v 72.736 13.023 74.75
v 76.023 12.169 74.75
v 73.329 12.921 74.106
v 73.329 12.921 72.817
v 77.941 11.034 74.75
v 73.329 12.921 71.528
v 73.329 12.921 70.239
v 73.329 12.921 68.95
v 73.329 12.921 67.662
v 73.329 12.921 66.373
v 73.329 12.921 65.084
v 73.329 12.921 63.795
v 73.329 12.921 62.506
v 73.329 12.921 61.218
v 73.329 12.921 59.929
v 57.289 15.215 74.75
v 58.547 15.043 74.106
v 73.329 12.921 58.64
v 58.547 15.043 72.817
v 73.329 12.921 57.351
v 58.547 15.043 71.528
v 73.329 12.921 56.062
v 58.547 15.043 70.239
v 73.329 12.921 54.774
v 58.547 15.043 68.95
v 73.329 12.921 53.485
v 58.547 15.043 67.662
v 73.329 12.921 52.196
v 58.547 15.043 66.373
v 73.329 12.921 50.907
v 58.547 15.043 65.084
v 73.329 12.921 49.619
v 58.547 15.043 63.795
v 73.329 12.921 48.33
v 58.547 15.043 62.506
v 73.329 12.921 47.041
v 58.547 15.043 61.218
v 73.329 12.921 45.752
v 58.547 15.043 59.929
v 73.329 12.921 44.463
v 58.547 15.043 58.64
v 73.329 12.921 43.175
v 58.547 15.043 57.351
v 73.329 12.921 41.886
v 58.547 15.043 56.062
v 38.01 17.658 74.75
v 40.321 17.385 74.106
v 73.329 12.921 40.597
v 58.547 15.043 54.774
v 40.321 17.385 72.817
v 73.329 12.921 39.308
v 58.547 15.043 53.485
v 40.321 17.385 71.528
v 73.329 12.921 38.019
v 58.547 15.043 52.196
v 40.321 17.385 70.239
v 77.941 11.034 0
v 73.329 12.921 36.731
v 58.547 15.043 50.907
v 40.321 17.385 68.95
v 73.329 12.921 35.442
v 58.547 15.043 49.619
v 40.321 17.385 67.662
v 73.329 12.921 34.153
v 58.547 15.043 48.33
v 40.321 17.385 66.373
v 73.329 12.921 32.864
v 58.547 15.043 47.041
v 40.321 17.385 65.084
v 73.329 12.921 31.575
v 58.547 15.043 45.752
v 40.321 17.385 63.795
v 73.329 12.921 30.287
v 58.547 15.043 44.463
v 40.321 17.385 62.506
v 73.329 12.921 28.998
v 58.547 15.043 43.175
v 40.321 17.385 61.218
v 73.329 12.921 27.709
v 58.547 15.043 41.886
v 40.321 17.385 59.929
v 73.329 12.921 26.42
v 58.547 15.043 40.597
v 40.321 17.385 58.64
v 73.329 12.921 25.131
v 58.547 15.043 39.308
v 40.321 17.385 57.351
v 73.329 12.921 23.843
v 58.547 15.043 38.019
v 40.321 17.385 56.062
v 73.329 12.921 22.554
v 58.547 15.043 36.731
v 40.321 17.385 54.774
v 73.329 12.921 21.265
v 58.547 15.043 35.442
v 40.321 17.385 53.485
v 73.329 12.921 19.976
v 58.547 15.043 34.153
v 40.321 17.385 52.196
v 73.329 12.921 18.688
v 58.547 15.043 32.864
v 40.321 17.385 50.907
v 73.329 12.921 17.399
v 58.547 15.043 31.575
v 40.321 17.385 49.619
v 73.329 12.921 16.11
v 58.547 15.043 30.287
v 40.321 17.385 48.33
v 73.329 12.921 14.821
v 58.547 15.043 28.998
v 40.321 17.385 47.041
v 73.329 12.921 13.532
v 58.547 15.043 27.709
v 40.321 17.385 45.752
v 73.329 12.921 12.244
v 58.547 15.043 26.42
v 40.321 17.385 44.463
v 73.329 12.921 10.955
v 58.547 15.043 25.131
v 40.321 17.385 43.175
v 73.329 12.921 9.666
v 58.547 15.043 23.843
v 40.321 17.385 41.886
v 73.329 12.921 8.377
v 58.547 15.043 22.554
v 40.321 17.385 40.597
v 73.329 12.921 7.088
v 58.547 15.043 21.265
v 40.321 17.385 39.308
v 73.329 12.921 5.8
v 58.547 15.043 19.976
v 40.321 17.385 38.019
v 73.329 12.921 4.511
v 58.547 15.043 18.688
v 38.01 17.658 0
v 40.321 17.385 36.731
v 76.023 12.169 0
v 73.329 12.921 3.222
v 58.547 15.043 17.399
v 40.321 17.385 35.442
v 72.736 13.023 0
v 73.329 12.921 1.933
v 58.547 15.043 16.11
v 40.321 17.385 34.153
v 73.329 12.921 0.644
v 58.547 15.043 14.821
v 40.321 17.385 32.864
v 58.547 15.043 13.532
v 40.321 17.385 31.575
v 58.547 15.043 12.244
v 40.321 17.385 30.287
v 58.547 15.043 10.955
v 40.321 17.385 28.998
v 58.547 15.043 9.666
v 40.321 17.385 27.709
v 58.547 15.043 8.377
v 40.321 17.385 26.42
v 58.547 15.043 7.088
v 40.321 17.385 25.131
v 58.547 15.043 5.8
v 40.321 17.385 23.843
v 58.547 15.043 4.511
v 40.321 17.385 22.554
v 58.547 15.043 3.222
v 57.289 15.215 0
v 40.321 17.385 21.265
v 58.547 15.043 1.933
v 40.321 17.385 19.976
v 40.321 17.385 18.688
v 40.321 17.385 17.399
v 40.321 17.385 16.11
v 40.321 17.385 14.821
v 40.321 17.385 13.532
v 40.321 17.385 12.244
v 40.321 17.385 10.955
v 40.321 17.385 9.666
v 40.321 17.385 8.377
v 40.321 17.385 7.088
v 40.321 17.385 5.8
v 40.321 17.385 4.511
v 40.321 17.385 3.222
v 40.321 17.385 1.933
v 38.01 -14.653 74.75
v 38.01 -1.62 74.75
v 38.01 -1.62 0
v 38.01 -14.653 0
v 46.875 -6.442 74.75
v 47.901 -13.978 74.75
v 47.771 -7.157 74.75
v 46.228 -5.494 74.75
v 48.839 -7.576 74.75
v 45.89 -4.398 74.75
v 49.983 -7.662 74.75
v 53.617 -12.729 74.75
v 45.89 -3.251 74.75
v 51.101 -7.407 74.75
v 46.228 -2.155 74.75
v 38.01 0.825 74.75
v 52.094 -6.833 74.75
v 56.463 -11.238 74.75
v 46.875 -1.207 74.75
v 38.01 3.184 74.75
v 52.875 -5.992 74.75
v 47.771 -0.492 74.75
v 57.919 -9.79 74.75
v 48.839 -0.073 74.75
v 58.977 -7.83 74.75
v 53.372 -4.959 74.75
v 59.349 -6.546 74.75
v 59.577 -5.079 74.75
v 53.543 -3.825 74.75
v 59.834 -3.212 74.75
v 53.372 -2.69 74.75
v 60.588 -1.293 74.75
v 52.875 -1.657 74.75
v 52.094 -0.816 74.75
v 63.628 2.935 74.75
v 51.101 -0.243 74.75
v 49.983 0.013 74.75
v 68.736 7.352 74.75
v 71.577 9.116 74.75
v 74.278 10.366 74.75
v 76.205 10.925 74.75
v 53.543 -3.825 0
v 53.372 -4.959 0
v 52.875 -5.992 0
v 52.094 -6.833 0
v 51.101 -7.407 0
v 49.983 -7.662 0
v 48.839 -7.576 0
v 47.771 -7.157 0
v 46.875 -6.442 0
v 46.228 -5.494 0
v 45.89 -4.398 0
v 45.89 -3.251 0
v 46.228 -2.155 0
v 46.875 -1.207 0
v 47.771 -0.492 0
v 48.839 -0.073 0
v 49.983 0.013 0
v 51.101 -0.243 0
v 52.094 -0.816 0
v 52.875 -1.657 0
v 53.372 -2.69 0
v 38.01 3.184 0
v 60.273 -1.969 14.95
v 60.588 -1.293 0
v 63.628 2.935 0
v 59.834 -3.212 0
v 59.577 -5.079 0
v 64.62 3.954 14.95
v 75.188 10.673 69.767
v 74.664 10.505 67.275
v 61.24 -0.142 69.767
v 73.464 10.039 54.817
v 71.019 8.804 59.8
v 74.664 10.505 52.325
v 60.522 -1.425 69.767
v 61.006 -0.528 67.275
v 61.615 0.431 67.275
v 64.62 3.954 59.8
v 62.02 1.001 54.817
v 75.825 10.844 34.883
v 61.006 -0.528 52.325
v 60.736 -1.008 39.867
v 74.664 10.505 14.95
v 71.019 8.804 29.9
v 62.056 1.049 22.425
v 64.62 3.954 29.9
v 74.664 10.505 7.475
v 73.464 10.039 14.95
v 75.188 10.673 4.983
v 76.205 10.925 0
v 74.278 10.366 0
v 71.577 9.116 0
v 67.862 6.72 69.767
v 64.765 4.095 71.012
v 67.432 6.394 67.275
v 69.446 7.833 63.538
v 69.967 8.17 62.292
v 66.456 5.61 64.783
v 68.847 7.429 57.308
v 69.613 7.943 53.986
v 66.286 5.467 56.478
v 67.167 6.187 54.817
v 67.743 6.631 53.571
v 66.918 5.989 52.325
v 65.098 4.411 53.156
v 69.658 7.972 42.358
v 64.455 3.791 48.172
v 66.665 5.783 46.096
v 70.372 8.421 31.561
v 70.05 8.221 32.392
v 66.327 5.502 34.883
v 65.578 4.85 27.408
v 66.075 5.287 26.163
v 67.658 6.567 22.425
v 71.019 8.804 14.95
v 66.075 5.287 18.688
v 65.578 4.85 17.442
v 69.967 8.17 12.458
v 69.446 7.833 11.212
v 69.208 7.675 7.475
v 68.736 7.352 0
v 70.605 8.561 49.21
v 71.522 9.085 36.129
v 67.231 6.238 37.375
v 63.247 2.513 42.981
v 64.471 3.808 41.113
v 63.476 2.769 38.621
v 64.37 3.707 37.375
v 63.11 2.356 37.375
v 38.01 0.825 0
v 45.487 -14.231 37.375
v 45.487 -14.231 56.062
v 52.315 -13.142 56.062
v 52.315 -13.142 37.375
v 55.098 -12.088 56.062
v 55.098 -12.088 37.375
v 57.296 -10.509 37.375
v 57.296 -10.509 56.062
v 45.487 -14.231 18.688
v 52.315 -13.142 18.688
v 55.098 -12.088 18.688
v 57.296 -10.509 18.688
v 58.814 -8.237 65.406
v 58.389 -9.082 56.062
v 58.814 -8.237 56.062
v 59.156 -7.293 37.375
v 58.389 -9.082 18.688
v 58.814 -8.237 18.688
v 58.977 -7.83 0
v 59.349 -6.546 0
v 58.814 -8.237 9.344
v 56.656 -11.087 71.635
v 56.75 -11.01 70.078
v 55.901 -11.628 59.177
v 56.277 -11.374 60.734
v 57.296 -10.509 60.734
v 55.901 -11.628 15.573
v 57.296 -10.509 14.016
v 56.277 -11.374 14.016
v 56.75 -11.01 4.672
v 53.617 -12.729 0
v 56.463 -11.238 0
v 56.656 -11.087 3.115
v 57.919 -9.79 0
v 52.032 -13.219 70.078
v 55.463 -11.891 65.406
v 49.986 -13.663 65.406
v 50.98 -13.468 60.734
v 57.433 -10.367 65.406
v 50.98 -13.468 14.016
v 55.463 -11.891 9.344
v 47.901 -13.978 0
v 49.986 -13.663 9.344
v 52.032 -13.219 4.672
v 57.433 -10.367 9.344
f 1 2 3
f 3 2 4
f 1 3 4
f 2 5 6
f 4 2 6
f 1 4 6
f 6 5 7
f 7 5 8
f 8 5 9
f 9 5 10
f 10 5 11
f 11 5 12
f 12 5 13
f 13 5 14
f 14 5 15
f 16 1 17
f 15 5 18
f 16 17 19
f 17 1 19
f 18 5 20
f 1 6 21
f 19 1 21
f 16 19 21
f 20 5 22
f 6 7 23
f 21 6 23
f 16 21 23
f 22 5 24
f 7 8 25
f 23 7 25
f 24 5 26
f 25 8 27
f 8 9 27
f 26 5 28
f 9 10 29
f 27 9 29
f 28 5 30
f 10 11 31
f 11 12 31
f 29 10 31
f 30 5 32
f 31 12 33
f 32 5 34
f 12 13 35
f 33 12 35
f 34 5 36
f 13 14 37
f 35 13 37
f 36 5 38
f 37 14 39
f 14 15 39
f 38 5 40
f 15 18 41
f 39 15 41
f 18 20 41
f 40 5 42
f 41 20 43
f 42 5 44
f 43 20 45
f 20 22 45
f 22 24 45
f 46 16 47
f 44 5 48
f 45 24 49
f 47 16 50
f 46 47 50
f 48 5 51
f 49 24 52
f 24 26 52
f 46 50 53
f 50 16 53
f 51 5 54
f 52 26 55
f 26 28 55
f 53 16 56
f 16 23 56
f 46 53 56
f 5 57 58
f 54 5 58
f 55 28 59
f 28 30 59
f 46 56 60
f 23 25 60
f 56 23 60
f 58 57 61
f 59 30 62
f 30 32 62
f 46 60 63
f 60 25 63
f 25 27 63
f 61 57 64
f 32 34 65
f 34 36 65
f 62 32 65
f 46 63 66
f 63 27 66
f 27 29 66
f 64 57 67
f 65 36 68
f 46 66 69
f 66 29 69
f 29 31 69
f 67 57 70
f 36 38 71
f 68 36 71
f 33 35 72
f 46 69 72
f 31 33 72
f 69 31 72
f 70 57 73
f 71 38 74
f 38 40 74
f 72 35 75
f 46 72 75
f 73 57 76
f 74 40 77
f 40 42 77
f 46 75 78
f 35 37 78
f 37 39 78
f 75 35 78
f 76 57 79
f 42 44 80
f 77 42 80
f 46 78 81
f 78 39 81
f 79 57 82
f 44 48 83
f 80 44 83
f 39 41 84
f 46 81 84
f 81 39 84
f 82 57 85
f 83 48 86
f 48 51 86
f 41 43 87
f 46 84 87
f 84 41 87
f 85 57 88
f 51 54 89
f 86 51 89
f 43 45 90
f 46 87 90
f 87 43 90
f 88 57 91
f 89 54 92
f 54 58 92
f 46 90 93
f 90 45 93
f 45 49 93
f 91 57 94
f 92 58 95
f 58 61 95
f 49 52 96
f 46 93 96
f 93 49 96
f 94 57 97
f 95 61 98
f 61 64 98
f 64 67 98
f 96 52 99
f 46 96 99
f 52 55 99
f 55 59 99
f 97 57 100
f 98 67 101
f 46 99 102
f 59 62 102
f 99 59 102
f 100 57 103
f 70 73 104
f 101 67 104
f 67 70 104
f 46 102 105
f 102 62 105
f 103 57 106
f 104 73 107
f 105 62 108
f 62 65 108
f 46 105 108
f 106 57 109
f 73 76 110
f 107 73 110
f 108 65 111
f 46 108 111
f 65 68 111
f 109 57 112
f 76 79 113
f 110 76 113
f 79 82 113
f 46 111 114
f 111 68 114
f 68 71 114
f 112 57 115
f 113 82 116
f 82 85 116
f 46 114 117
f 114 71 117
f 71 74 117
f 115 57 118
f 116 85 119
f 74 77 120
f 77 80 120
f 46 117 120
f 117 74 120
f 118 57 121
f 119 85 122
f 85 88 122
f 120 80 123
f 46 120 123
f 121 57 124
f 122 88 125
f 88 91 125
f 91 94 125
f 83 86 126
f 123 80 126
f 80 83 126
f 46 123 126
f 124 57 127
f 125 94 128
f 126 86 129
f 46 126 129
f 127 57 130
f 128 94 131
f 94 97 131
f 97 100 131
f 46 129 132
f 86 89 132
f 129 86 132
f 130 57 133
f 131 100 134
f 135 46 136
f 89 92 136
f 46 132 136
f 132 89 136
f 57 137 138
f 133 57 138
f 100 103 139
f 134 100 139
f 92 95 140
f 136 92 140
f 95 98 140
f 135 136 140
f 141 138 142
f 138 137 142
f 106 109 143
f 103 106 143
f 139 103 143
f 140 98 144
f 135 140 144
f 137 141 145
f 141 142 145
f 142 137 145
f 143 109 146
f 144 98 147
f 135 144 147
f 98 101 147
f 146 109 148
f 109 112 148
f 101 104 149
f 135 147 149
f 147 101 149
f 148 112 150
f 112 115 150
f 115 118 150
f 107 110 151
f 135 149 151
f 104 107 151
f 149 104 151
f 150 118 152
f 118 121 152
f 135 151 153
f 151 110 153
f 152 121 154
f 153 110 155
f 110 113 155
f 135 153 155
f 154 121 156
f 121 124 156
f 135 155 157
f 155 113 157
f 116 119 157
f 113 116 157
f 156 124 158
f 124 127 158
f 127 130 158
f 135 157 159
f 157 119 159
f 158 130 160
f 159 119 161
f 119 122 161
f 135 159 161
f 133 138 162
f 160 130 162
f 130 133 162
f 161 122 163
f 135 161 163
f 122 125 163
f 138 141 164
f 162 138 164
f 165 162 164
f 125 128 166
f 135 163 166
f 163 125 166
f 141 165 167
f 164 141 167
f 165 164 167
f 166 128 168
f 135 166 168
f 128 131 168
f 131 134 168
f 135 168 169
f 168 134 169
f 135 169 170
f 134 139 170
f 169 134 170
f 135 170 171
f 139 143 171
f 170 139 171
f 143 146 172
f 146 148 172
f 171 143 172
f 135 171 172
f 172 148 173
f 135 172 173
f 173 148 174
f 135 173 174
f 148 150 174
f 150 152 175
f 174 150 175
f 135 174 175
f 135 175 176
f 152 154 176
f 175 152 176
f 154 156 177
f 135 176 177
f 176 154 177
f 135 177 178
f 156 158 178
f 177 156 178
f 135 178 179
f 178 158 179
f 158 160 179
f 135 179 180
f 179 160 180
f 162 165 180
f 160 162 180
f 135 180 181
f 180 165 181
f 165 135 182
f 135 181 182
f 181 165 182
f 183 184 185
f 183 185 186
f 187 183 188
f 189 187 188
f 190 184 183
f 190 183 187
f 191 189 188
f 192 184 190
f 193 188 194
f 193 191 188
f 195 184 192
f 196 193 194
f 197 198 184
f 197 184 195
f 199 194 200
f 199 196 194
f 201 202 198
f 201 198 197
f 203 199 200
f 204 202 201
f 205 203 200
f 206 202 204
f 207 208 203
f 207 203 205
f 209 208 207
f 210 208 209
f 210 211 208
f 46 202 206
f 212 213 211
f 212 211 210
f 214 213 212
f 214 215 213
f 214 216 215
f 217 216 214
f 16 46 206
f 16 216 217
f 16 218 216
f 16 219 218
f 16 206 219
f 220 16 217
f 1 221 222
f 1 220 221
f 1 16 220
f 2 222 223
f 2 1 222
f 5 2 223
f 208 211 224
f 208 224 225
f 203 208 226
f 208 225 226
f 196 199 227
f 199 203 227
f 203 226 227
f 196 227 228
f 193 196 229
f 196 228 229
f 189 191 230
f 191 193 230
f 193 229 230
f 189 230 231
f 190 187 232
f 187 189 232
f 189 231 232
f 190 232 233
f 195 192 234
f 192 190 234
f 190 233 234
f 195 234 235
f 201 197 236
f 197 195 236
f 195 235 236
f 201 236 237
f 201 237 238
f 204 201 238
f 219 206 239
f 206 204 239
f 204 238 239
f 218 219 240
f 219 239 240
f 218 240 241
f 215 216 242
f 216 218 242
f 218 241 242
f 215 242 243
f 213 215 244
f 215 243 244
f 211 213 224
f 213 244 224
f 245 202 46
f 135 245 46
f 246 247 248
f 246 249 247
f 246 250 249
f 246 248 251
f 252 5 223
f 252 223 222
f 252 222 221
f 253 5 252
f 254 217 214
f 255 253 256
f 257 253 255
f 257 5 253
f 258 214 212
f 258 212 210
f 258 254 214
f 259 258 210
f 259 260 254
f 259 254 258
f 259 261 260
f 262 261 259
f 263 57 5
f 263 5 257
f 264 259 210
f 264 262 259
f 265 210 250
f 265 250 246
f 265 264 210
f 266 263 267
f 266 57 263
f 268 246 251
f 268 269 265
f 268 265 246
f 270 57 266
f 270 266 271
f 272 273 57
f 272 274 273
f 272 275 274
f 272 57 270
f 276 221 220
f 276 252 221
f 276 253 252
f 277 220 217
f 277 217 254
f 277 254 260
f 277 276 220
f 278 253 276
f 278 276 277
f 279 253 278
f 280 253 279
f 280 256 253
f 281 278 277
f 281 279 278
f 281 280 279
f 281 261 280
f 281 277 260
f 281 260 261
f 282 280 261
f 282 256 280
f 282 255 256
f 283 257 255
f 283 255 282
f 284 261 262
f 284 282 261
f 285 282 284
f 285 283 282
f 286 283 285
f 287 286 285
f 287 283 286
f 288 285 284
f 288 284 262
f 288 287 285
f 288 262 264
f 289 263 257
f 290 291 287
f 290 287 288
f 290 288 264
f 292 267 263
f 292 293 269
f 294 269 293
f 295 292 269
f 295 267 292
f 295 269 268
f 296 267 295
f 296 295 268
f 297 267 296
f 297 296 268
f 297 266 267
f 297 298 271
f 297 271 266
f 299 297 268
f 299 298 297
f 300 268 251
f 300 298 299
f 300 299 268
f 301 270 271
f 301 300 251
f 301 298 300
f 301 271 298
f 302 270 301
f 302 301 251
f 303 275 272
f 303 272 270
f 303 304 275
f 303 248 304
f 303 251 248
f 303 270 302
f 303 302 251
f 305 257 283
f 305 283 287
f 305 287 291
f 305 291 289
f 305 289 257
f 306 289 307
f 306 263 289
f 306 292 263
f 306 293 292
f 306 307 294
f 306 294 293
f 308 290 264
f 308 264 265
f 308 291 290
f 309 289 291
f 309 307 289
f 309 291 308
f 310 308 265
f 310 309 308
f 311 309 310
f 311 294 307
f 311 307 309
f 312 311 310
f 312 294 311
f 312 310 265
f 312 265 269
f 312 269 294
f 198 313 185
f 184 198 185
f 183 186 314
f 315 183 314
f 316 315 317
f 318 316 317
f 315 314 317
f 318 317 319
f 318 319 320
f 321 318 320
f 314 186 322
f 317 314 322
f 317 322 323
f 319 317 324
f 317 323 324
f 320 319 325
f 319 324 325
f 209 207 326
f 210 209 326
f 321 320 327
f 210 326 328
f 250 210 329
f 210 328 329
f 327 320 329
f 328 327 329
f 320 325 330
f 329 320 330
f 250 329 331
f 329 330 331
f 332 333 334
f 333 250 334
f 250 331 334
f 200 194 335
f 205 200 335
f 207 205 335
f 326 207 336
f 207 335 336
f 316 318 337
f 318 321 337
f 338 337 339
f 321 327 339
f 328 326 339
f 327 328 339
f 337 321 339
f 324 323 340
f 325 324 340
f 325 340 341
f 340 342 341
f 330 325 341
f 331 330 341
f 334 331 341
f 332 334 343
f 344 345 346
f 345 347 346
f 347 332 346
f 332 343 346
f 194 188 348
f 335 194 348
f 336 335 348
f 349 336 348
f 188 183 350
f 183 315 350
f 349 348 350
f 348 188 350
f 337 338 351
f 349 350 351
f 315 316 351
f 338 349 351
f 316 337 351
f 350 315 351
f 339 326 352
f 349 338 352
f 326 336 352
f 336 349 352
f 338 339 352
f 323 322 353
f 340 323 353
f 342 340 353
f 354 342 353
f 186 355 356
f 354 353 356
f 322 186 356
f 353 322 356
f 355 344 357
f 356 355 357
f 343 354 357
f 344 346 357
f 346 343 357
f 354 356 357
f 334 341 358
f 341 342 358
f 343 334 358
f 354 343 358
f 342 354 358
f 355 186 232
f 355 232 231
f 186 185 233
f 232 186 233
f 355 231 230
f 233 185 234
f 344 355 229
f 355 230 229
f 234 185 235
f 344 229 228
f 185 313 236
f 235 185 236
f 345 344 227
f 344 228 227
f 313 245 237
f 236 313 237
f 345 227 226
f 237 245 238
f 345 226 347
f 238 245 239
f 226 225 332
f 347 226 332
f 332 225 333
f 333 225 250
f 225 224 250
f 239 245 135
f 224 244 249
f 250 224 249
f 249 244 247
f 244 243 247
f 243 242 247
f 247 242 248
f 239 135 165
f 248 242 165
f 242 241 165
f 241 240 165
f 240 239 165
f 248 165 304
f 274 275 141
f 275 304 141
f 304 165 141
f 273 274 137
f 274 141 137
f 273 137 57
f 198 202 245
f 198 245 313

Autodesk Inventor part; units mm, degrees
ref_plane "YZ Plane" through (0, 0, 0) normal (1, 0, 0) x (0, 1, 0)
ref_plane "XZ Plane" through (0, 0, 0) normal (0, 1, 0) x (-1, 0, 0)
ref_plane "XY Plane" through (0, 0, 0) normal (0, 0, 1) x (1, 0, 0)
sketch "Sketch3" plane through (0, 0, 0) normal (0, 0, 1) x (1, 0, 0)
  line L0 (-80.5781, 0.8246) -> (-80.5781, 20.7988) construction
  circle A0 centre (-80.5781, 0.8246) radius 13.481
  line L1 (-53.7179, 12.5571) -> (-53.7179, -10.9927)
  arc A1 (-53.7179, -10.9927) -> (-51.5054, -12.9814) centre (-51.7179, -10.9927) ccw
  arc A2 (-51.5054, 14.5458) -> (-53.7179, 12.5571) centre (-51.7179, 12.5571) ccw
  line L2 (36.2229, -3.6088) -> (-51.5054, -12.9814)
  line L3 (38.0104, 3.1845) -> (38.0104, -1.6201)
  line L4 (-80.5781, 0.8246) -> (49.5525, 0.8246) construction
  circle A3 centre (49.6953, -3.8247) radius 3.848
  line L5 (59.6953, 14.884) -> (59.6953, -12.7998) construction
  spline S0 degree 4 poles (77.9414, 11.0338) (75.5683, 12.9654) (71.7145, 13.0272) (66.8099, 13.9036) (60.7685, 14.7338) (56.2959, 15.3578) (51.7728, 15.9509) (47.2242, 16.5426) (42.6244, 17.1111) (37.9974, 17.6651) (33.3378, 18.1987) (28.6546, 18.7114) (23.9504, 19.2026) (19.2309, 19.6699) (14.5002, 20.1135) (9.7632, 20.5291) (5.025, 20.9191) (0.2903, 21.2792) (-4.4372, 21.6095) (-9.151, 21.9092) (-13.8524, 22.1766) (-18.5268, 22.4102) (-23.2002, 22.6105) (-27.8558, 22.7627) (-32.4748, 22.8704) (-37.0553, 22.9312) (-41.5904, 22.9454) (-46.0738, 22.9127) (-50.5027, 22.8323) (-54.8678, 22.7052) (-59.1755, 22.5324) (-63.394, 22.3084) (-67.5752, 22.0492) (-71.5451, 21.7209) (-75.7777, 21.4072) (-79.04, 20.9063) (-83.4863, 20.5541) (-87.0067, 20.037) (-90.7113, 19.5168) (-94.2172, 18.9459) (-97.6363, 18.3426) (-100.9342, 17.7015) (-104.1216, 17.0263) (-107.1909, 16.3187) (-110.1396, 15.5797) (-112.9656, 14.8117) (-115.6652, 14.0172) (-118.2357, 13.1965) (-120.6759, 12.3541) (-122.9817, 11.4895) (-125.1529, 10.6071) (-127.1857, 9.7065) (-129.0794, 8.7914) (-130.8324, 7.8633) (-132.4429, 6.923) (-133.9096, 5.9737) (-135.2322, 5.016) (-136.4083, 4.0508) (-137.4392, 3.0816) (-138.3215, 2.1025) (-139.0592, 1.1321) (-139.6407, 0.1249) (-140.106, -0.8362) (-140.3589, -2.0477) (-140.602, -2.598) (-140.1166, -5.4607) (-140.0539, -5.4622) (-139.4639, -6.7645) (-138.8842, -7.4979) (-138.1173, -8.3934) (-137.2199, -9.1877) (-136.1721, -9.9852) (-134.9893, -10.738) (-133.6669, -11.4655) (-132.2091, -12.1599) (-130.6156, -12.8245) (-128.8897, -13.4579) (-127.0312, -14.0591) (-125.0439, -14.6296) (-122.9287, -15.1678) (-120.6879, -15.6738) (-118.3241, -16.1476) (-115.8396, -16.5892) (-113.2366, -16.9984) (-110.5176, -17.3742) (-107.6861, -17.7183) (-104.7439, -18.0297) (-101.6943, -18.3095) (-98.5398, -18.5568) (-95.2843, -18.7732) (-91.9297, -18.9579) (-88.48, -19.1131) (-84.9381, -19.2376) (-81.3071, -19.3341) (-77.5906, -19.4015) (-73.7915, -19.4421) (-69.9139, -19.4561) (-65.961, -19.445) (-61.9362, -19.4102) (-57.8434, -19.3518) (-53.6861, -19.2727) (-49.4679, -19.1731) (-45.1932, -19.0538) (-40.8649, -18.9183) (-36.4879, -18.766) (-32.0649, -18.5992) (-27.598, -18.4192) (-23.0941, -18.227) (-18.5434, -18.0273) (-13.9382, -17.8076) (-9.3141, -17.5719) (-4.666, -17.3195) (-0.0002, -17.052) (4.6675, -16.7728) (9.3655, -16.4759) (14.0236, -16.1832) (19.545, -15.7815) (23.3079, -15.6072) (27.1098, -15.1781) (28.8959, -15.0599) knots 0 0 0 0 0 0.024672 0.034555 0.0445 0.054495 0.064543 0.074632 0.084755 0.094911 0.105094 0.115299 0.125521 0.135755 0.145995 0.156237 0.166475 0.176705 0.186921 0.197118 0.207299 0.217463 0.227605 0.23772 0.247796 0.257824 0.267798 0.277713 0.287563 0.297345 0.307053 0.31668 0.326224 0.335555 0.344908 0.354162 0.363308 0.372467 0.381393 0.390196 0.398872 0.407415 0.41582 0.424082 0.432193 0.44015 0.447945 0.455574 0.46303 0.470307 0.477401 0.484305 0.491015 0.497525 0.503831 0.509931 0.515822 0.521506 0.526986 0.53227 0.537373 0.542316 0.547131 0.552525 0.557529 0.562533 0.567581 0.57205 0.576988 0.582082 0.587354 0.592817 0.598478 0.604341 0.610406 0.616671 0.623133 0.629789 0.636632 0.643658 0.650861 0.658236 0.665777 0.673478 0.681333 0.689338 0.697486 0.705771 0.71419 0.722736 0.731403 0.740188 0.749084 0.758087 0.767192 0.776393 0.785687 0.795067 0.804529 0.814069 0.823682 0.833362 0.843106 0.852907 0.862763 0.872667 0.88262 0.892624 0.902675 0.912766 0.92289 0.933033 0.943191 0.953358 0.963531 0.973703 0.984092 1 1 1 1 1
  line L6 (7.5013, -16.4763) -> (50.2906, -13.6435) construction
  arc A4 (44.8353, -17.2546) -> (13.385, -19.3367) centre (31.5327, -54.8885) ccw construction
  line L7 (159.6953, -3.8066) -> (59.6953, -3.8066) construction
  line L8 (-51.5054, 14.5458) -> (36.2229, 5.1732)
  arc A5 (36.2229, -3.6088) -> (38.0104, -1.6201) centre (36.0104, -1.6201) ccw
  arc A6 (38.0104, 3.1845) -> (36.2229, 5.1732) centre (36.0104, 3.1845) ccw
  spline S1 degree 4 poles (78.1029, 11.0141) (76.6463, 11.2227) (73.9909, 10.5042) (70.2765, 8.6041) (66.0429, 5.3938) (62.3889, 1.8499) (60.314, -1.2467) (59.5572, -3.5763) (59.5773, -5.0793) knots 0 0 0 0 0 0.302475 0.43895 0.576633 0.708802 1 1 1 1 1
  spline S2 degree 4 poles (28.8959, -15.0599) (34.0984, -14.7105) (49.269, -14.182) (58.5645, -15.239) (59.5773, -5.0793) knots 0 0 0 0 0 1 1 1 1 1
  line L9 (28.8959, -15.0599) -> (34.0984, -14.7105) construction
  line L10 (34.0984, -14.7105) -> (49.269, -14.182) construction
  line L11 (49.269, -14.182) -> (58.5645, -15.239) construction
  line L12 (58.5645, -15.239) -> (59.5773, -5.0793) construction
  line L13 (-140.4646, -2.8394) -> (159.4818, -3.8173) construction
  line L14 (-132.0856, 0.6333) -> (-132.0856, -6.3667)
  line L15 (-132.0856, -6.3667) -> (-110.3816, -12.3574)
  line L16 (-110.3816, -12.3574) -> (-104.797, -12.3574)
  line L17 (-104.797, -12.3574) -> (-104.797, -18.0156)
  line L18 (-132.0856, 0.6333) -> (-110.3816, 10.553)
  line L19 (-110.3816, 10.553) -> (-104.1736, 10.553)
  line L20 (-104.1736, 10.553) -> (-104.1736, 17.0026)
  line L21 (38.0104, 0.8246) -> (38.0104, -14.6534)
  line L22 (38.0104, 0.8246) -> (38.0104, 17.6585)
  point P0 (0, 0)
  point P1 (17.6589, 23.5628)
  point P2 (75.883, 10.8572)
  point P3 (72.8647, 9.7686)
  point P4 (69.4179, 7.8149)
  point P5 (66.0452, 5.2617)
  point P6 (63.1887, 2.4463)
  point P7 (61.1228, -0.3317)
  point P8 (59.9357, -2.8689)
  point P9 (-160.0931, -3.8671)
  point P10 (28.8959, -15.0599)
  point P11 (69.5533, 13.4647)
  point P12 (65.1899, 14.1023)
  point P13 (60.7936, 14.7318)
  point P14 (56.3207, 15.3468)
  point P15 (51.7945, 15.947)
  point P16 (47.2398, 16.5346)
  point P17 (42.6414, 17.1053)
  point P18 (33.3491, 18.1925)
  point P19 (28.6632, 18.7055)
  point P20 (23.9568, 19.1966)
  point P21 (19.2348, 19.6643)
  point P22 (14.5017, 20.1074)
  point P23 (9.7623, 20.5238)
  point P24 (5.0217, 20.9132)
  point P25 (0.2844, 21.2735)
  point P26 (-4.4451, 21.6038)
  point P27 (-9.1614, 21.9032)
  point P28 (-13.86, 22.1702)
  point P29 (-18.5361, 22.4036)
  point P30 (-23.211, 22.601)
  point P31 (-27.8721, 22.754)
  point P32 (-32.4966, 22.8611)
  point P33 (-37.0797, 22.9217)
  point P34 (-41.6169, 22.9356)
  point P35 (-46.1028, 22.9023)
  point P36 (-50.5329, 22.8216)
  point P37 (-54.9021, 22.6941)
  point P38 (-59.2065, 22.5195)
  point P39 (-63.4406, 22.2977)
  point P40 (-67.6008, 22.0302)
  point P41 (-71.6806, 21.7165)
  point P42 (-75.6814, 21.3591)
  point P43 (-79.1834, 20.9458)
  point P44 (-83.4048, 20.5095)
  point P45 (-87.1309, 20.023)
  point P46 (-90.7527, 19.494)
  point P47 (-94.2725, 18.9266)
  point P48 (-97.6845, 18.3211)
  point P49 (-100.9861, 17.6791)
  point P50 (-107.2438, 16.2934)
  point P51 (-110.1931, 15.553)
  point P52 (-113.0194, 14.7835)
  point P53 (-115.7191, 13.987)
  point P54 (-118.2898, 13.165)
  point P55 (-120.7294, 12.3201)
  point P56 (-123.0349, 11.454)
  point P57 (-125.2048, 10.569)
  point P58 (-127.2364, 9.6666)
  point P59 (-129.1282, 8.7491)
  point P60 (-130.8786, 7.8185)
  point P61 (-132.486, 6.8762)
  point P62 (-133.9488, 5.9245)
  point P63 (-135.2661, 4.9648)
  point P64 (-136.4363, 3.9987)
  point P65 (-137.4592, 3.0275)
  point P66 (-138.3336, 2.0531)
  point P67 (-139.0591, 1.0763)
  point P68 (-139.6352, 0.0983)
  point P69 (-140.0613, -0.8802)
  point P70 (-140.338, -1.8576)
  point P71 (-140.1239, -5.2398)
  point P72 (-139.9547, -5.7022)
  point P73 (-139.492, -6.6066)
  point P74 (-138.8844, -7.4823)
  point P75 (-138.1328, -8.3292)
  point P76 (-137.2384, -9.147)
  point P77 (-136.202, -9.9355)
  point P78 (-135.0249, -10.6943)
  point P79 (-133.7085, -11.4228)
  point P80 (-132.2548, -12.1206)
  point P81 (-130.6648, -12.7879)
  point P82 (-128.941, -13.4239)
  point P83 (-127.0846, -14.0282)
  point P84 (-125.0983, -14.6009)
  point P85 (-122.9839, -15.1415)
  point P86 (-120.7435, -15.6497)
  point P87 (-118.3798, -16.1256)
  point P88 (-115.8952, -16.569)
  point P89 (-113.2918, -16.9797)
  point P90 (-110.5723, -17.3574)
  point P91 (-107.74, -17.7027)
  point P92 (-101.7463, -18.2964)
  point P93 (-98.5909, -18.5451)
  point P94 (-95.3341, -18.7623)
  point P95 (-91.9783, -18.9484)
  point P96 (-88.5271, -19.1041)
  point P97 (-84.9838, -19.2298)
  point P98 (-81.3514, -19.3267)
  point P99 (-77.6332, -19.3951)
  point P100 (-73.8324, -19.4362)
  point P101 (-69.9531, -19.4509)
  point P102 (-65.9985, -19.4404)
  point P103 (-61.9719, -19.4059)
  point P104 (-57.8772, -19.3483)
  point P105 (-53.718, -19.2694)
  point P106 (-49.4979, -19.1701)
  point P107 (-45.2211, -19.0516)
  point P108 (-40.8909, -18.916)
  point P109 (-36.5118, -18.7642)
  point P110 (-32.0871, -18.5977)
  point P111 (-27.6213, -18.418)
  point P112 (-23.1183, -18.2269)
  point P113 (-18.5646, -18.0247)
  point P114 (-13.9566, -17.8054)
  point P115 (-9.3252, -17.5693)
  point P116 (-4.674, -17.317)
  point P117 (-0.0078, -17.05)
  point P118 (4.6686, -16.7695)
  point P119 (9.3513, -16.477)
  point P120 (14.0352, -16.1731)
  point P121 (18.7161, -15.8596)
  point P122 (23.3889, -15.5371)
  point P123 (78.0825, 12.164)
  point P124 (159.2574, -3.8401)
  point P125 (158.8836, -3.8779)
  point P126 (158.3607, -3.9307)
  point P127 (157.6896, -3.9985)
  point P128 (156.8706, -4.081)
  point P129 (155.9046, -4.1779)
  point P130 (154.7931, -4.2892)
  point P131 (153.5367, -4.4143)
  point P132 (152.1372, -4.5532)
  point P133 (150.5955, -4.7056)
  point P134 (148.914, -4.8712)
  point P135 (147.0936, -5.0494)
  point P136 (145.137, -5.2399)
  point P137 (143.0457, -5.4421)
  point P138 (140.8221, -5.6563)
  point P139 (138.4686, -5.8813)
  point P140 (135.9876, -6.1174)
  point P141 (133.3815, -6.3634)
  point P142 (130.6533, -6.6196)
  point P143 (127.8054, -6.8851)
  point P144 (124.8414, -7.1596)
  point P145 (121.7634, -7.4428)
  point P146 (118.5756, -7.7341)
  point P147 (115.2804, -8.0332)
  point P148 (111.8817, -8.3395)
  point P149 (108.3828, -8.6527)
  point P150 (104.787, -8.9722)
  point P151 (101.0985, -9.2974)
  point P152 (97.3206, -9.6283)
  point P153 (93.4572, -9.9643)
  point P154 (89.5122, -10.3048)
  point P155 (85.4898, -10.6492)
  point P156 (81.3936, -10.9969)
  point P157 (77.2284, -11.3479)
  point P158 (72.9975, -11.701)
  point P159 (68.7057, -12.0556)
  point P160 (64.3572, -12.4117)
  point P161 (59.9559, -12.7678)
  point P162 (55.5069, -13.1239)
  point P163 (51.0138, -13.4788)
  point P164 (46.4817, -13.8316)
  point P165 (41.9148, -14.182)
  point P166 (35.7035, -14.3277)
  point P167 (32.6946, -14.8708)
  point P168 (82.2459, 11.5043)
  point P169 (86.3364, 10.8401)
  point P170 (90.3495, 10.1732)
  point P171 (94.2816, 9.5051)
  point P172 (98.1288, 8.837)
  point P173 (101.8872, 8.171)
  point P174 (105.5538, 7.5086)
  point P175 (109.1244, 6.8507)
  point P176 (112.596, 6.1997)
  point P177 (115.9653, 5.5565)
  point P178 (119.2287, 4.9229)
  point P179 (122.3835, 4.3007)
  point P180 (125.4264, 3.6911)
  point P181 (128.3547, 3.0956)
  point P182 (131.1654, 2.5157)
  point P183 (133.8561, 1.9532)
  point P184 (136.4244, 1.4093)
  point P185 (138.8676, 0.8855)
  point P186 (141.1833, 0.383)
  point P187 (143.3697, -0.0964)
  point P188 (145.4247, -0.5518)
  point P189 (147.3462, -0.9817)
  point P190 (149.1327, -1.3852)
  point P191 (150.7821, -1.7608)
  point P192 (152.2935, -2.1073)
  point P193 (153.6651, -2.4241)
  point P194 (154.8954, -2.7103)
  point P195 (155.9838, -2.9647)
  point P196 (156.9291, -3.187)
  point P197 (157.7307, -3.376)
  point P198 (158.3871, -3.5317)
  point P199 (158.8986, -3.6529)
  dimension "d3" = 26.962
  dimension "d6" = 7.696
  dimension "d7" = 110
  dimension "d8" = 100
  dimension "d9" = 2
  dimension "d11" = 4.6493
  dimension "d25" = 7
  dimension "d26" = 3.5
  dimension "d27" = 8.379
  dimension "d28" = 30.083
  dimension "d29" = 5
  dimension "d30" = 5
  dimension "d31" = 59.8865
extrude "Extrusion3" add sketch "Sketch3" along normal blind 74.75 contours L22 S0 S1 S2 L21 L3
properties part number "3P.05.06.JS.flap trailing edge 74_CPY" material "Polyurethane Foam"
